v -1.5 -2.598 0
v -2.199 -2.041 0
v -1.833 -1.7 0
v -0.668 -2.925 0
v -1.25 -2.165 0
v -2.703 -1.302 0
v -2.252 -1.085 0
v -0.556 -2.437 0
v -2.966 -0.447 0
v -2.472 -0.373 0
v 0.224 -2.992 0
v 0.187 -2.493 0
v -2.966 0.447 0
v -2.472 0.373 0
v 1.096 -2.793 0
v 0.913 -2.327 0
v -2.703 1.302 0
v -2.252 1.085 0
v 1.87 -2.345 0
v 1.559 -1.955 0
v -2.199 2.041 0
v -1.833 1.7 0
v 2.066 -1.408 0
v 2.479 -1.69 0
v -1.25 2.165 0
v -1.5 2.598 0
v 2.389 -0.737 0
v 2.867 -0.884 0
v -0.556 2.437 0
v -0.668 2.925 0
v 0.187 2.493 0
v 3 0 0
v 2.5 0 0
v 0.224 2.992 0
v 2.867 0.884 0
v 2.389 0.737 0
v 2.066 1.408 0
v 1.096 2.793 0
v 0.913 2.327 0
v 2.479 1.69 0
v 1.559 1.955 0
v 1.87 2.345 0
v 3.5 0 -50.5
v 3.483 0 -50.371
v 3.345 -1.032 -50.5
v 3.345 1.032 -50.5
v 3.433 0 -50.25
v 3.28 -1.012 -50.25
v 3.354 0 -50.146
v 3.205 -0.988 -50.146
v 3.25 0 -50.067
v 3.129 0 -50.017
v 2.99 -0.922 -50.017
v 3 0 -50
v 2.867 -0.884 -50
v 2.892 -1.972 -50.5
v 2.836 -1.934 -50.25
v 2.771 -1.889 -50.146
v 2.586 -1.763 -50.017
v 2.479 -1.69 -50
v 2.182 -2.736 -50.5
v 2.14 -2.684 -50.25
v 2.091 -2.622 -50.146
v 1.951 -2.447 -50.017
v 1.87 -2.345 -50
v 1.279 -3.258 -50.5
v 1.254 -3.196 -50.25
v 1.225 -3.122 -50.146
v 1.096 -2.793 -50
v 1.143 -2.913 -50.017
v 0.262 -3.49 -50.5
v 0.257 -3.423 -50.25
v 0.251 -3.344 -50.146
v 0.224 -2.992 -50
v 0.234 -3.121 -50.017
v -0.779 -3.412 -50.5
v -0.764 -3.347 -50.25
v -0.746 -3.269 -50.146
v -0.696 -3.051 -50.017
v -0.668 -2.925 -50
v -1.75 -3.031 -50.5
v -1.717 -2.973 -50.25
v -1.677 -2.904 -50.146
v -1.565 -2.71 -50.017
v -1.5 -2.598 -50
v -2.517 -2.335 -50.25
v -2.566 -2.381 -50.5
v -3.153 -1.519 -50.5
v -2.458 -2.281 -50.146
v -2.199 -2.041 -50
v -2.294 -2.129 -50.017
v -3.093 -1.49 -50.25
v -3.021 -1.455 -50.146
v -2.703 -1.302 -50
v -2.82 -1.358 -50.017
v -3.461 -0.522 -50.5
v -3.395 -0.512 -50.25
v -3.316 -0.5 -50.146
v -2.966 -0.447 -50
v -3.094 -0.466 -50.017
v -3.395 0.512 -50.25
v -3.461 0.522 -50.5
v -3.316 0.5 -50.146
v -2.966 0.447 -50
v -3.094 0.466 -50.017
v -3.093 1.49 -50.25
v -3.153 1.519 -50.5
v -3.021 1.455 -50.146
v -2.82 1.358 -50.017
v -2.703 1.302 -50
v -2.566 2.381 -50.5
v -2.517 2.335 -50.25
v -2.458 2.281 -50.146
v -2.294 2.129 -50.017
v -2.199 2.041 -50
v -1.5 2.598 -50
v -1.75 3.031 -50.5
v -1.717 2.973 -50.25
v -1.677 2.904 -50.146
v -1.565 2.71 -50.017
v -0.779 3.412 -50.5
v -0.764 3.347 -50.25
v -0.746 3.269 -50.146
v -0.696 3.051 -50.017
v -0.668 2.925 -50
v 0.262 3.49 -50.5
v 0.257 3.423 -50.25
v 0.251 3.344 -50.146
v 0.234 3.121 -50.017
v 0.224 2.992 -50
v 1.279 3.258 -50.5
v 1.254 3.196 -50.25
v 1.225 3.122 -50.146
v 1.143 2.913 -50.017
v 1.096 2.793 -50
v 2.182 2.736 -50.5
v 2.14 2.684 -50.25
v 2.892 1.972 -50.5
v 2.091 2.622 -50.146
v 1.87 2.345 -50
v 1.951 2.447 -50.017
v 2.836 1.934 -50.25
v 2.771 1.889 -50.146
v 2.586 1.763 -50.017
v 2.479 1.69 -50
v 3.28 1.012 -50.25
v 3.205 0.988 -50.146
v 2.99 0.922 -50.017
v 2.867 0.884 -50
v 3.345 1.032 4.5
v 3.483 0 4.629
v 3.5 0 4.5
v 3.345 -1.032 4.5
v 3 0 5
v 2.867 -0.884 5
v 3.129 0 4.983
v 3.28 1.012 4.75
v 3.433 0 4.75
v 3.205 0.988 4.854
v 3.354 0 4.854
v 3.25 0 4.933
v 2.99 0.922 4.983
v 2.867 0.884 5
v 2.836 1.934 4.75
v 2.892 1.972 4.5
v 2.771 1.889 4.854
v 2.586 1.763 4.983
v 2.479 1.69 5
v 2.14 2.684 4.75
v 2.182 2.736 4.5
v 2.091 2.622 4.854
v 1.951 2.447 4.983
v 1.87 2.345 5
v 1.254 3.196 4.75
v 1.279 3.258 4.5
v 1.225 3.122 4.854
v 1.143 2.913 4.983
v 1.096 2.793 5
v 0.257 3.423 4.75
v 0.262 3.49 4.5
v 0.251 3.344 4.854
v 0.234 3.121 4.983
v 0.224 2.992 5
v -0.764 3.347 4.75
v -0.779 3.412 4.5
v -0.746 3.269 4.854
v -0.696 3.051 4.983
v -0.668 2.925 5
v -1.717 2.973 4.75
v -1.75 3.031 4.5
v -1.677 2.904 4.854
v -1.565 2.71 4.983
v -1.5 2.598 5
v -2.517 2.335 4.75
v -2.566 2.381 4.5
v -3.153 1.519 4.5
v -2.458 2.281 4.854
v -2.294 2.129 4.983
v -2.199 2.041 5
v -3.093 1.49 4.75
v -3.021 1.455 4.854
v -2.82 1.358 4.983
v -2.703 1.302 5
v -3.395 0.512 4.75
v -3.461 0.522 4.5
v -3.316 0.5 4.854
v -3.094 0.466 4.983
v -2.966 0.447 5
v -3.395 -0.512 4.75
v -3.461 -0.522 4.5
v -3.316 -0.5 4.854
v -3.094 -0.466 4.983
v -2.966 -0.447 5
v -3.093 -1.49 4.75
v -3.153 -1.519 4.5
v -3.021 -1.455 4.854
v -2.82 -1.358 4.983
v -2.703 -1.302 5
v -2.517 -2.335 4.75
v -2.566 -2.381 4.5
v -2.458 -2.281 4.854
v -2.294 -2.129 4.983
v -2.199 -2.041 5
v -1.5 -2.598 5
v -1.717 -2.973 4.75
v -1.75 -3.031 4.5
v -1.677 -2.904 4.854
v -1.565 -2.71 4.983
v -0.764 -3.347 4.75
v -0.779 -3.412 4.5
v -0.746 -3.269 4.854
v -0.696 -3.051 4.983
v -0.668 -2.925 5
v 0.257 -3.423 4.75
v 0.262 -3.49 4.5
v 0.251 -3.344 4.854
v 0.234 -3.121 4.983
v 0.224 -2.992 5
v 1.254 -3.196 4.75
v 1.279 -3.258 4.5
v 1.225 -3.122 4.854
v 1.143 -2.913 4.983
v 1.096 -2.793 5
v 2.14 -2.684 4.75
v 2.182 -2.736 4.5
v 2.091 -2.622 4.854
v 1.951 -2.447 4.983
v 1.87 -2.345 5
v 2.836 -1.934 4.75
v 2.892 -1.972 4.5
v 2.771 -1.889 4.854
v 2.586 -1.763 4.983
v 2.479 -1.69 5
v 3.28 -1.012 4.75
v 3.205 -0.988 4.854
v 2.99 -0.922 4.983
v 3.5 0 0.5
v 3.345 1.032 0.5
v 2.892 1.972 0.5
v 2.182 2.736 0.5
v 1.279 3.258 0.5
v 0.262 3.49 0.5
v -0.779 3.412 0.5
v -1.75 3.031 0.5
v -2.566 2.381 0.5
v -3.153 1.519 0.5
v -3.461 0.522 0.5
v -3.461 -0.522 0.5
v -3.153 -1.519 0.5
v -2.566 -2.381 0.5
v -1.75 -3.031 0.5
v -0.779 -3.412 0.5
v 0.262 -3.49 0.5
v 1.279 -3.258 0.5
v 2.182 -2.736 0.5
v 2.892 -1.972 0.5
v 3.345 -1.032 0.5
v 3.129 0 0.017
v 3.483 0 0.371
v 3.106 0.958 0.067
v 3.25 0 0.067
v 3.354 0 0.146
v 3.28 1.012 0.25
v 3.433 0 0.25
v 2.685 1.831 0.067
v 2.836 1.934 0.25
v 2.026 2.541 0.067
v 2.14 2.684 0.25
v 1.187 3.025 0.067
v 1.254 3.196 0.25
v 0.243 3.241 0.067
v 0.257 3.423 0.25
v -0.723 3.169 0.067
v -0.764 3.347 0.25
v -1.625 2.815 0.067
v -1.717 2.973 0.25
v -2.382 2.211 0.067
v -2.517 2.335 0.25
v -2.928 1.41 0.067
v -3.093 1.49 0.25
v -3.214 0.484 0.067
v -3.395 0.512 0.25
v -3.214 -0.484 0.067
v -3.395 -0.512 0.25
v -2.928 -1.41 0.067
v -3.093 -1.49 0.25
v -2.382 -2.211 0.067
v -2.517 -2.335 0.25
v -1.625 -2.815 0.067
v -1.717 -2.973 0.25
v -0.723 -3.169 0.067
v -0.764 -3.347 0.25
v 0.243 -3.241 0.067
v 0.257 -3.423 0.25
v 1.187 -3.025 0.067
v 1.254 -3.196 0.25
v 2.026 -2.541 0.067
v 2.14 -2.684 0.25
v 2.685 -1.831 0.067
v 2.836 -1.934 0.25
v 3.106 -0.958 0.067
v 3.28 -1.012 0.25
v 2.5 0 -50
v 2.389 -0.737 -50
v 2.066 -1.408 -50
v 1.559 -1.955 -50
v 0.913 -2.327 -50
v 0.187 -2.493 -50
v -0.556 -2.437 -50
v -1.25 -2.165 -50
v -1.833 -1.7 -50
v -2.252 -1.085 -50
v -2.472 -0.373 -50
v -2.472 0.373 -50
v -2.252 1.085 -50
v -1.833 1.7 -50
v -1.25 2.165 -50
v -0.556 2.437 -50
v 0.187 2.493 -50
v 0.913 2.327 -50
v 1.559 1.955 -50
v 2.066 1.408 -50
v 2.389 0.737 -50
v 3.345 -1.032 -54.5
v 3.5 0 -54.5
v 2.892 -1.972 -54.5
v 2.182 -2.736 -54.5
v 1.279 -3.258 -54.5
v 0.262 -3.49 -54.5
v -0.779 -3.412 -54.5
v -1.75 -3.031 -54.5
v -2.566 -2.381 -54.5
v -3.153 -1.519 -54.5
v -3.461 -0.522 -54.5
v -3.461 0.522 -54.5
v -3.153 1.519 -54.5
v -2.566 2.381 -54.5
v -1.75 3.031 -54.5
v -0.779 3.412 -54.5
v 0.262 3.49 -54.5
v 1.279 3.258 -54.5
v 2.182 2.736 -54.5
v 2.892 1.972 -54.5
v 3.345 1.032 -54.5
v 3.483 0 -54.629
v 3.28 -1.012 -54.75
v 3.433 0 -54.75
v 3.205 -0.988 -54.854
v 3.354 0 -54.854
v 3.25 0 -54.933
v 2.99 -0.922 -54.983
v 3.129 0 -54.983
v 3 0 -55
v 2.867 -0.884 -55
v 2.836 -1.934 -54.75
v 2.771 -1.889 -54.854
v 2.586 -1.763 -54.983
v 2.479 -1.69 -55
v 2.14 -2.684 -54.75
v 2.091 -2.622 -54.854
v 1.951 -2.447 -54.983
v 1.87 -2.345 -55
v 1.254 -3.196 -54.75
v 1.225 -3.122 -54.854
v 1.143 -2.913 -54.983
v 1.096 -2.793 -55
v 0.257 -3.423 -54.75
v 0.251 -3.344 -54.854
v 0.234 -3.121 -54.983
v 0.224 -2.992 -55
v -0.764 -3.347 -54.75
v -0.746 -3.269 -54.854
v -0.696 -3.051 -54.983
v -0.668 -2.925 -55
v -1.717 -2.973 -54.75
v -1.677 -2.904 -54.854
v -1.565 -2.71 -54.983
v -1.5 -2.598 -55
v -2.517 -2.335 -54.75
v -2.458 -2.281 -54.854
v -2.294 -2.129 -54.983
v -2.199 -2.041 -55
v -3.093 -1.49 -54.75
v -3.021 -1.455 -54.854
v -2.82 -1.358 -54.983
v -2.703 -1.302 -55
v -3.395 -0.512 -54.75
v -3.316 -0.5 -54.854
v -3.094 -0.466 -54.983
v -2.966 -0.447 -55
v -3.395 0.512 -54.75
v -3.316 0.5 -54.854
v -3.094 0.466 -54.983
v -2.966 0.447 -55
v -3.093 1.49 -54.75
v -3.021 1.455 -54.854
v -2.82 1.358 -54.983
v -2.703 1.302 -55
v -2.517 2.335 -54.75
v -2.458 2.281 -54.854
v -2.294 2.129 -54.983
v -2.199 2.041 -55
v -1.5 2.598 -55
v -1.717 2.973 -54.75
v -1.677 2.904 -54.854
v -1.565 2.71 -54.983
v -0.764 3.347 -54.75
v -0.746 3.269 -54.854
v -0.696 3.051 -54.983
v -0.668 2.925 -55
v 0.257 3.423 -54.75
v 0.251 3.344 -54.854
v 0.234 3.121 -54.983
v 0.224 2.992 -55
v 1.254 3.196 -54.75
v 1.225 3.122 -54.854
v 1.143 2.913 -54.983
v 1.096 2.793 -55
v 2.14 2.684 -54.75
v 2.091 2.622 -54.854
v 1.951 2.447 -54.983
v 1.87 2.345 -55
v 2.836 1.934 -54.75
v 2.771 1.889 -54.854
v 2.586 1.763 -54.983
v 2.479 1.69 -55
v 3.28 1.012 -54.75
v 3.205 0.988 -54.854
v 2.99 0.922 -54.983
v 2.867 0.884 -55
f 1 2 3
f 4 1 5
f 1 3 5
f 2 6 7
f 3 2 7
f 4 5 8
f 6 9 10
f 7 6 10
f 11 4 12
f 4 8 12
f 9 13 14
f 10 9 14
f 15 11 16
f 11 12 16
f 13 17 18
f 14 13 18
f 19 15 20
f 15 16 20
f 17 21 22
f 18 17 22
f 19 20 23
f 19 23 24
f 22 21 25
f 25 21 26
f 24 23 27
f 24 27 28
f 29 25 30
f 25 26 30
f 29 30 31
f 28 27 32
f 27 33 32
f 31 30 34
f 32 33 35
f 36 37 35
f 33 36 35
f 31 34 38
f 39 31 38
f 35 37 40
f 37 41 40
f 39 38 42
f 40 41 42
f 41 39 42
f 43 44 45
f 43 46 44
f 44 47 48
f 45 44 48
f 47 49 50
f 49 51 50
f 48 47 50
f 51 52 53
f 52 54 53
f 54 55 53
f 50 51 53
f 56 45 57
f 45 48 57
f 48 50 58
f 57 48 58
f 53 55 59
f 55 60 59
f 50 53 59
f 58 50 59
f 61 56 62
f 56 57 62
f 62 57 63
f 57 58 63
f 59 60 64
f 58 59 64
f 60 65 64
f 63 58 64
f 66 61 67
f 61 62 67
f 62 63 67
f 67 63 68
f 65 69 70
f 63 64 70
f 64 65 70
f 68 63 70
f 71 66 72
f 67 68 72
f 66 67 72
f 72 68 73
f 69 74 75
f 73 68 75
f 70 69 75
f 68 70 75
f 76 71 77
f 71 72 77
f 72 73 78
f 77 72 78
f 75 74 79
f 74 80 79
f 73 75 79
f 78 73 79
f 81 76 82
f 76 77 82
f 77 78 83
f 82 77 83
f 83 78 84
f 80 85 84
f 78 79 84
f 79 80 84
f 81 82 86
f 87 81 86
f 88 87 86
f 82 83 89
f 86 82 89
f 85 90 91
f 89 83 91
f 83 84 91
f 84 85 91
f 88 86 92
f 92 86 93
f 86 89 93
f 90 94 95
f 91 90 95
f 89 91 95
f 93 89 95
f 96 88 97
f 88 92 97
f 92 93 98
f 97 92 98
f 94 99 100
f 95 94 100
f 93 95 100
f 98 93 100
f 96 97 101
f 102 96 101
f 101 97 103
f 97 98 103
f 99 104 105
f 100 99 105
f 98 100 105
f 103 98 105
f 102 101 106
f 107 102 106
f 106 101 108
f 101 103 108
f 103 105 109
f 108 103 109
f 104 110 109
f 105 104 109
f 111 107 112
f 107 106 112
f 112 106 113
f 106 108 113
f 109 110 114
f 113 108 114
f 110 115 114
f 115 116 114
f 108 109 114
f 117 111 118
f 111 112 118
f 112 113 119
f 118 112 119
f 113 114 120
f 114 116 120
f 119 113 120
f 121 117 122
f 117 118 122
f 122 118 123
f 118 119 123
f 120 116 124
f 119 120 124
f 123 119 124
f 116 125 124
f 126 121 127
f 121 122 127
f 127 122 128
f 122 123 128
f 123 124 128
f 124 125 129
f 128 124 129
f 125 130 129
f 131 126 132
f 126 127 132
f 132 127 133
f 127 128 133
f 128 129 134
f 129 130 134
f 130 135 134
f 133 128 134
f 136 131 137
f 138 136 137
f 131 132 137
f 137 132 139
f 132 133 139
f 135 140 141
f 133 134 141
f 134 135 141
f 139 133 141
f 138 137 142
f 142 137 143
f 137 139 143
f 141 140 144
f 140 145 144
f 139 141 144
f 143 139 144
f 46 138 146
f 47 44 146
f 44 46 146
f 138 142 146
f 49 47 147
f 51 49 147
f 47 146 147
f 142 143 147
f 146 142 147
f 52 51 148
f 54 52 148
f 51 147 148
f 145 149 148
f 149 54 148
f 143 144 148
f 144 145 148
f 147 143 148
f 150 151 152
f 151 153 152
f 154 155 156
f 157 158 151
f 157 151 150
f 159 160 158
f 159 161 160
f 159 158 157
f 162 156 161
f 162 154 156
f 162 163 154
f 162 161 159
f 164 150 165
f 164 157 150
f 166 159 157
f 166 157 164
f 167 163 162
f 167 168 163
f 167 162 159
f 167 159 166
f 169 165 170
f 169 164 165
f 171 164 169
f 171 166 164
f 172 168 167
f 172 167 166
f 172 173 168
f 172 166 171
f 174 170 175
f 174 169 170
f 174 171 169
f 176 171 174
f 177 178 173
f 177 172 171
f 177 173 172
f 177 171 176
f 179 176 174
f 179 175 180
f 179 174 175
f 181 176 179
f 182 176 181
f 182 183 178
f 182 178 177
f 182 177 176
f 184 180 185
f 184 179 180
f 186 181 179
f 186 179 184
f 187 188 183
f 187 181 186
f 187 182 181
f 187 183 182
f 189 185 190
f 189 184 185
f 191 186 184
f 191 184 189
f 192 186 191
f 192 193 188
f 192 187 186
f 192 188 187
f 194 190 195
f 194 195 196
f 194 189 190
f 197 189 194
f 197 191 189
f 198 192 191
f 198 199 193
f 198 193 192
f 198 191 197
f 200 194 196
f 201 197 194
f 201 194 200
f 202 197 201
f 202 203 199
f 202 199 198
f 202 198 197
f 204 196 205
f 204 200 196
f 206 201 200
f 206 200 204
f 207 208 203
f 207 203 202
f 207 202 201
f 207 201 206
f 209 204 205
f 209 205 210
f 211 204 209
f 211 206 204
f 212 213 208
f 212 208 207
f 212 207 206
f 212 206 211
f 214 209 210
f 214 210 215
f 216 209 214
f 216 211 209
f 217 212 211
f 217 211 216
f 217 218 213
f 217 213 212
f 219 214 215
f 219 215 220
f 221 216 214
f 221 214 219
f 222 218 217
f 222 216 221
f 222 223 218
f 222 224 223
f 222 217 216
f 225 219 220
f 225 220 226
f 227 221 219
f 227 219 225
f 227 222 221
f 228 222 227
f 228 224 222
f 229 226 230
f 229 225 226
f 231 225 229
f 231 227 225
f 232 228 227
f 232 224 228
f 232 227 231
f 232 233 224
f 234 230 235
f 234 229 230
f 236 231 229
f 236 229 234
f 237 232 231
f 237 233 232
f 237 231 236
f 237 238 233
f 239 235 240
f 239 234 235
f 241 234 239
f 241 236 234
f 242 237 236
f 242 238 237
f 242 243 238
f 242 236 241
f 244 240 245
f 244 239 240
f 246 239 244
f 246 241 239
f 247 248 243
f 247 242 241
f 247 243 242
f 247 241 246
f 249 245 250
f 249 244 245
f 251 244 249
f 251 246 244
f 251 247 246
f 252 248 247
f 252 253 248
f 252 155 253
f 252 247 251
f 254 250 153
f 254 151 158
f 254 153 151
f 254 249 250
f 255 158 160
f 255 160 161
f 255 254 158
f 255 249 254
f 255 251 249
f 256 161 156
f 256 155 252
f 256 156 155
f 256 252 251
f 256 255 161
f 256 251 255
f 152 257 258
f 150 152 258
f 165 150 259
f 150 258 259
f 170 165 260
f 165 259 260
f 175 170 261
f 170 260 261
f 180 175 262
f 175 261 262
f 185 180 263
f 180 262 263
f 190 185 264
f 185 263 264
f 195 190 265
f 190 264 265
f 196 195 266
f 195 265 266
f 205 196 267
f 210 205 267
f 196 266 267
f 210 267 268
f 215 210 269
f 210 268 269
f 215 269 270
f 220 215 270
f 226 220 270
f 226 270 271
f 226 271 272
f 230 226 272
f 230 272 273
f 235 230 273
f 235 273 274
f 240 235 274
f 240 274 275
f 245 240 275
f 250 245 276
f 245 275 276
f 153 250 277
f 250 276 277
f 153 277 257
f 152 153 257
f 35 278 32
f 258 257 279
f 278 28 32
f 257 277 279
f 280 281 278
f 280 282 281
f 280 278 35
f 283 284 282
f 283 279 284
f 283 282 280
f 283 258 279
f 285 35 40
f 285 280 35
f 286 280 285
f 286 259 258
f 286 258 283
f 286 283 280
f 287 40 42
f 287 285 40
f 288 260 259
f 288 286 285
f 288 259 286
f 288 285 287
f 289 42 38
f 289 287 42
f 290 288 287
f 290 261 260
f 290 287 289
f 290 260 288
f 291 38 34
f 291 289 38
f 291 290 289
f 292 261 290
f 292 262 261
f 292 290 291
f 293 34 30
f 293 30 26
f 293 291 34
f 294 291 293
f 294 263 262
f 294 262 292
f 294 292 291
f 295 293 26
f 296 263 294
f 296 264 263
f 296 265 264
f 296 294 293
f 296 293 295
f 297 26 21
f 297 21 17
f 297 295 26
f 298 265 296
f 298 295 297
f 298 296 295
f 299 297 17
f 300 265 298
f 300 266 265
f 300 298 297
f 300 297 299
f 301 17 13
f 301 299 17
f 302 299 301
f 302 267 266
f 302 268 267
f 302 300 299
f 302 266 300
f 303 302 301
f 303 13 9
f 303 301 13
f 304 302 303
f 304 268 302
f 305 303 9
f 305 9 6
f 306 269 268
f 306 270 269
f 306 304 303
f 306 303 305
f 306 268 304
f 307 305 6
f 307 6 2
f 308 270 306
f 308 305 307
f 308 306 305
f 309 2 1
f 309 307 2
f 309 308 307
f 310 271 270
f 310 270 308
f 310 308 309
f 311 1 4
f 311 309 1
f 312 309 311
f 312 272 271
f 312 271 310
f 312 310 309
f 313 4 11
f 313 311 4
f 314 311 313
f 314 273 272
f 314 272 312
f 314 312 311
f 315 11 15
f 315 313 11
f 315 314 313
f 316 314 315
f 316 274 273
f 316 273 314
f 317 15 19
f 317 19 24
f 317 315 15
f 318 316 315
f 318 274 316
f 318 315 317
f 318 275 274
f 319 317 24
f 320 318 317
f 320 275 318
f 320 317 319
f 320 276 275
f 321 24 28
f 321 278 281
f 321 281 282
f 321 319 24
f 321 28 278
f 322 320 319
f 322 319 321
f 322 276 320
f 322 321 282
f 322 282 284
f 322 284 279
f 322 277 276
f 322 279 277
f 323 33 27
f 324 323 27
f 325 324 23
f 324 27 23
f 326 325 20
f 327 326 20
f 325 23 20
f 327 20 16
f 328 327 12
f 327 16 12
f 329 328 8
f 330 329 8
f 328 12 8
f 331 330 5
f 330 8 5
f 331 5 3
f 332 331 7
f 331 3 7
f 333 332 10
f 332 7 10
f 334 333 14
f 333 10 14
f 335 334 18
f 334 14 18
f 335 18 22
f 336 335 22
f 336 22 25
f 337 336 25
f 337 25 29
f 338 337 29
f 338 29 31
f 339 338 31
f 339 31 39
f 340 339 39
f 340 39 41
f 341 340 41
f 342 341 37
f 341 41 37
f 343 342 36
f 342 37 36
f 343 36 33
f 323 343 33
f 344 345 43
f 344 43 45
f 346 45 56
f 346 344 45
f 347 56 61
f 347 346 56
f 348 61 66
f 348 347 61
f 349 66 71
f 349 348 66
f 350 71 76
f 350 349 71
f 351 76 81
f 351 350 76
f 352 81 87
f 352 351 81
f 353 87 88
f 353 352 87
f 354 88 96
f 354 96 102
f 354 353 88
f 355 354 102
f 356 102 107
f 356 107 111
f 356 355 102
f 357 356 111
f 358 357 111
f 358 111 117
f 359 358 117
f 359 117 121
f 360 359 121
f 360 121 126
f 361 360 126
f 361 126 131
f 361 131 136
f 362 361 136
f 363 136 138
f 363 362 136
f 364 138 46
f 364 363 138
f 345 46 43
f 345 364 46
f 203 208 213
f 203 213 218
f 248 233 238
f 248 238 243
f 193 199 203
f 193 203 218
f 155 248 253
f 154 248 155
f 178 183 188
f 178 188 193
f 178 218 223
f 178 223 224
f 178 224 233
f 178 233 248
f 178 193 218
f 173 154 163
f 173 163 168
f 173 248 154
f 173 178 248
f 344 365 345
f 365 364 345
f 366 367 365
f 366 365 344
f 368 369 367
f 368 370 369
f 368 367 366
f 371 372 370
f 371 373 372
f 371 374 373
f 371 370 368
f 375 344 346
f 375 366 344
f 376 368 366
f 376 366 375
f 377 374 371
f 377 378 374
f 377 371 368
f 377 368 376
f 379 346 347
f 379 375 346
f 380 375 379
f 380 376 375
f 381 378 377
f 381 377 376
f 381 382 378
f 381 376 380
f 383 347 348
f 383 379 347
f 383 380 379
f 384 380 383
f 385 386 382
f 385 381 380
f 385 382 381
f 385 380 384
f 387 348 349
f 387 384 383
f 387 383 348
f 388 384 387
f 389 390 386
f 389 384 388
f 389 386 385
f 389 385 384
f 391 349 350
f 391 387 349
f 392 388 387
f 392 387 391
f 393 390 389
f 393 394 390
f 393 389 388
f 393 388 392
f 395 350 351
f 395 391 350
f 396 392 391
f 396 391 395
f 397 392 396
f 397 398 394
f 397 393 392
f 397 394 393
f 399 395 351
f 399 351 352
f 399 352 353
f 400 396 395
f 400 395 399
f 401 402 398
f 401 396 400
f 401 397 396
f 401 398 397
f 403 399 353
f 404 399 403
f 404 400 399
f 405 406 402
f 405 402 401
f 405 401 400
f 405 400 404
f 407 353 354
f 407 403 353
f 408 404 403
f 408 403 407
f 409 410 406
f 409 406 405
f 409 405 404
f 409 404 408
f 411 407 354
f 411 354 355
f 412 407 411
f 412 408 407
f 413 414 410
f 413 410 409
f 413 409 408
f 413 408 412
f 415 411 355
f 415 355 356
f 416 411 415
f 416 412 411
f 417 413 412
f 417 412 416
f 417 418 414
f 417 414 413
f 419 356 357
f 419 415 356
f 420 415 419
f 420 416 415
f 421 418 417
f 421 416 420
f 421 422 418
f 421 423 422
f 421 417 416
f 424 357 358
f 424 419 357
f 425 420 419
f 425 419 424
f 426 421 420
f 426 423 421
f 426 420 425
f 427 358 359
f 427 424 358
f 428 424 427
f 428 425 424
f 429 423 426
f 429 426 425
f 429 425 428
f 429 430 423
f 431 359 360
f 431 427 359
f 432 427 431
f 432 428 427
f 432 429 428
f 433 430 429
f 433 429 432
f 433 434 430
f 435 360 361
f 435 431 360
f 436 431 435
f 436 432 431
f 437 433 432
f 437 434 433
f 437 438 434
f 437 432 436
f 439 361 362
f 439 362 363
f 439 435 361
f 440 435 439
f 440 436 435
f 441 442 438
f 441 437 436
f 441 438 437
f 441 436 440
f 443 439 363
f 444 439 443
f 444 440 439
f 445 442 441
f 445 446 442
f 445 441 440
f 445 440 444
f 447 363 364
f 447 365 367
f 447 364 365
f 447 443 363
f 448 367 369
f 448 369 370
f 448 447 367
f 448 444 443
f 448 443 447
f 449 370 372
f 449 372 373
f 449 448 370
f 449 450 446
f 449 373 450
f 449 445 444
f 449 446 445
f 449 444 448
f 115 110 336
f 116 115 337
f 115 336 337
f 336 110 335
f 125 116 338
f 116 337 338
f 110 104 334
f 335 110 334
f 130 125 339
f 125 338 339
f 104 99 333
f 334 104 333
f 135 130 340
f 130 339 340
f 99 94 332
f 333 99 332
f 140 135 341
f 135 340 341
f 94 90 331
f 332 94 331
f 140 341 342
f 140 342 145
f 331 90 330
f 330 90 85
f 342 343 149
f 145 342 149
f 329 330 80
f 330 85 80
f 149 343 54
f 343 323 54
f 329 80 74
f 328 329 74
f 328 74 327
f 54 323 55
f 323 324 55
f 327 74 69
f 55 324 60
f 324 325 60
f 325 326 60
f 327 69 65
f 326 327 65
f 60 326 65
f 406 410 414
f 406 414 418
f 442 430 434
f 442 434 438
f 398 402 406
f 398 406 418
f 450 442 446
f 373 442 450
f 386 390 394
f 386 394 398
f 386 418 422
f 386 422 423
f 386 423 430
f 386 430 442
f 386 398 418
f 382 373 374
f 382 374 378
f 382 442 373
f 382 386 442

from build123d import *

# Parameters (mm, degrees)
SKETCH1_R           = 3.5
BOSS_EXTRUDE1_DEPTH = 5
SKETCH2_R           = 2.5
BOSS_EXTRUDE2_DEPTH = 50
BOSS_EXTRUDE3_START = 5
SKETCH3_R           = 3.5
BOSS_EXTRUDE3_DEPTH = 5
FILLET1_R           = 0.5


with BuildPart() as part:
    # Sketch1 → Boss-Extrude1 (new body)
    with BuildSketch(Plane.XY):
        Circle(SKETCH1_R)
    extrude(amount=BOSS_EXTRUDE1_DEPTH)

    # Sketch2 → Boss-Extrude2 (add)
    with BuildSketch(Plane(origin=(0, 0, 0), x_dir=(-1, 0, 0), z_dir=(0, 0, -1))):
        with Locations(Location((0, 0, 0), (0, 0, 180))):
            Circle(SKETCH2_R)
    extrude(amount=BOSS_EXTRUDE2_DEPTH)

    # Sketch3 → Boss-Extrude3 (add)
    with BuildSketch(Plane(origin=(0, 0, -50), x_dir=(-1, 0, 0), z_dir=(0, 0, -1)).offset(BOSS_EXTRUDE3_START)):
        with Locations(Location((0, 0, 0), (0, 0, 180))):
            Circle(SKETCH3_R)
    extrude(amount=-BOSS_EXTRUDE3_DEPTH)

    # Fillet1
    fillet1_edges = [part.edges().sort_by_distance(p)[0] for p in [
        (-3.5, 0, 0),
        (-3.5, 0, 5),
        (-3.5, 0, -50),
        (-3.5, 0, -55),
    ]]
    fillet(fillet1_edges, radius=FILLET1_R)


solid = part.part
